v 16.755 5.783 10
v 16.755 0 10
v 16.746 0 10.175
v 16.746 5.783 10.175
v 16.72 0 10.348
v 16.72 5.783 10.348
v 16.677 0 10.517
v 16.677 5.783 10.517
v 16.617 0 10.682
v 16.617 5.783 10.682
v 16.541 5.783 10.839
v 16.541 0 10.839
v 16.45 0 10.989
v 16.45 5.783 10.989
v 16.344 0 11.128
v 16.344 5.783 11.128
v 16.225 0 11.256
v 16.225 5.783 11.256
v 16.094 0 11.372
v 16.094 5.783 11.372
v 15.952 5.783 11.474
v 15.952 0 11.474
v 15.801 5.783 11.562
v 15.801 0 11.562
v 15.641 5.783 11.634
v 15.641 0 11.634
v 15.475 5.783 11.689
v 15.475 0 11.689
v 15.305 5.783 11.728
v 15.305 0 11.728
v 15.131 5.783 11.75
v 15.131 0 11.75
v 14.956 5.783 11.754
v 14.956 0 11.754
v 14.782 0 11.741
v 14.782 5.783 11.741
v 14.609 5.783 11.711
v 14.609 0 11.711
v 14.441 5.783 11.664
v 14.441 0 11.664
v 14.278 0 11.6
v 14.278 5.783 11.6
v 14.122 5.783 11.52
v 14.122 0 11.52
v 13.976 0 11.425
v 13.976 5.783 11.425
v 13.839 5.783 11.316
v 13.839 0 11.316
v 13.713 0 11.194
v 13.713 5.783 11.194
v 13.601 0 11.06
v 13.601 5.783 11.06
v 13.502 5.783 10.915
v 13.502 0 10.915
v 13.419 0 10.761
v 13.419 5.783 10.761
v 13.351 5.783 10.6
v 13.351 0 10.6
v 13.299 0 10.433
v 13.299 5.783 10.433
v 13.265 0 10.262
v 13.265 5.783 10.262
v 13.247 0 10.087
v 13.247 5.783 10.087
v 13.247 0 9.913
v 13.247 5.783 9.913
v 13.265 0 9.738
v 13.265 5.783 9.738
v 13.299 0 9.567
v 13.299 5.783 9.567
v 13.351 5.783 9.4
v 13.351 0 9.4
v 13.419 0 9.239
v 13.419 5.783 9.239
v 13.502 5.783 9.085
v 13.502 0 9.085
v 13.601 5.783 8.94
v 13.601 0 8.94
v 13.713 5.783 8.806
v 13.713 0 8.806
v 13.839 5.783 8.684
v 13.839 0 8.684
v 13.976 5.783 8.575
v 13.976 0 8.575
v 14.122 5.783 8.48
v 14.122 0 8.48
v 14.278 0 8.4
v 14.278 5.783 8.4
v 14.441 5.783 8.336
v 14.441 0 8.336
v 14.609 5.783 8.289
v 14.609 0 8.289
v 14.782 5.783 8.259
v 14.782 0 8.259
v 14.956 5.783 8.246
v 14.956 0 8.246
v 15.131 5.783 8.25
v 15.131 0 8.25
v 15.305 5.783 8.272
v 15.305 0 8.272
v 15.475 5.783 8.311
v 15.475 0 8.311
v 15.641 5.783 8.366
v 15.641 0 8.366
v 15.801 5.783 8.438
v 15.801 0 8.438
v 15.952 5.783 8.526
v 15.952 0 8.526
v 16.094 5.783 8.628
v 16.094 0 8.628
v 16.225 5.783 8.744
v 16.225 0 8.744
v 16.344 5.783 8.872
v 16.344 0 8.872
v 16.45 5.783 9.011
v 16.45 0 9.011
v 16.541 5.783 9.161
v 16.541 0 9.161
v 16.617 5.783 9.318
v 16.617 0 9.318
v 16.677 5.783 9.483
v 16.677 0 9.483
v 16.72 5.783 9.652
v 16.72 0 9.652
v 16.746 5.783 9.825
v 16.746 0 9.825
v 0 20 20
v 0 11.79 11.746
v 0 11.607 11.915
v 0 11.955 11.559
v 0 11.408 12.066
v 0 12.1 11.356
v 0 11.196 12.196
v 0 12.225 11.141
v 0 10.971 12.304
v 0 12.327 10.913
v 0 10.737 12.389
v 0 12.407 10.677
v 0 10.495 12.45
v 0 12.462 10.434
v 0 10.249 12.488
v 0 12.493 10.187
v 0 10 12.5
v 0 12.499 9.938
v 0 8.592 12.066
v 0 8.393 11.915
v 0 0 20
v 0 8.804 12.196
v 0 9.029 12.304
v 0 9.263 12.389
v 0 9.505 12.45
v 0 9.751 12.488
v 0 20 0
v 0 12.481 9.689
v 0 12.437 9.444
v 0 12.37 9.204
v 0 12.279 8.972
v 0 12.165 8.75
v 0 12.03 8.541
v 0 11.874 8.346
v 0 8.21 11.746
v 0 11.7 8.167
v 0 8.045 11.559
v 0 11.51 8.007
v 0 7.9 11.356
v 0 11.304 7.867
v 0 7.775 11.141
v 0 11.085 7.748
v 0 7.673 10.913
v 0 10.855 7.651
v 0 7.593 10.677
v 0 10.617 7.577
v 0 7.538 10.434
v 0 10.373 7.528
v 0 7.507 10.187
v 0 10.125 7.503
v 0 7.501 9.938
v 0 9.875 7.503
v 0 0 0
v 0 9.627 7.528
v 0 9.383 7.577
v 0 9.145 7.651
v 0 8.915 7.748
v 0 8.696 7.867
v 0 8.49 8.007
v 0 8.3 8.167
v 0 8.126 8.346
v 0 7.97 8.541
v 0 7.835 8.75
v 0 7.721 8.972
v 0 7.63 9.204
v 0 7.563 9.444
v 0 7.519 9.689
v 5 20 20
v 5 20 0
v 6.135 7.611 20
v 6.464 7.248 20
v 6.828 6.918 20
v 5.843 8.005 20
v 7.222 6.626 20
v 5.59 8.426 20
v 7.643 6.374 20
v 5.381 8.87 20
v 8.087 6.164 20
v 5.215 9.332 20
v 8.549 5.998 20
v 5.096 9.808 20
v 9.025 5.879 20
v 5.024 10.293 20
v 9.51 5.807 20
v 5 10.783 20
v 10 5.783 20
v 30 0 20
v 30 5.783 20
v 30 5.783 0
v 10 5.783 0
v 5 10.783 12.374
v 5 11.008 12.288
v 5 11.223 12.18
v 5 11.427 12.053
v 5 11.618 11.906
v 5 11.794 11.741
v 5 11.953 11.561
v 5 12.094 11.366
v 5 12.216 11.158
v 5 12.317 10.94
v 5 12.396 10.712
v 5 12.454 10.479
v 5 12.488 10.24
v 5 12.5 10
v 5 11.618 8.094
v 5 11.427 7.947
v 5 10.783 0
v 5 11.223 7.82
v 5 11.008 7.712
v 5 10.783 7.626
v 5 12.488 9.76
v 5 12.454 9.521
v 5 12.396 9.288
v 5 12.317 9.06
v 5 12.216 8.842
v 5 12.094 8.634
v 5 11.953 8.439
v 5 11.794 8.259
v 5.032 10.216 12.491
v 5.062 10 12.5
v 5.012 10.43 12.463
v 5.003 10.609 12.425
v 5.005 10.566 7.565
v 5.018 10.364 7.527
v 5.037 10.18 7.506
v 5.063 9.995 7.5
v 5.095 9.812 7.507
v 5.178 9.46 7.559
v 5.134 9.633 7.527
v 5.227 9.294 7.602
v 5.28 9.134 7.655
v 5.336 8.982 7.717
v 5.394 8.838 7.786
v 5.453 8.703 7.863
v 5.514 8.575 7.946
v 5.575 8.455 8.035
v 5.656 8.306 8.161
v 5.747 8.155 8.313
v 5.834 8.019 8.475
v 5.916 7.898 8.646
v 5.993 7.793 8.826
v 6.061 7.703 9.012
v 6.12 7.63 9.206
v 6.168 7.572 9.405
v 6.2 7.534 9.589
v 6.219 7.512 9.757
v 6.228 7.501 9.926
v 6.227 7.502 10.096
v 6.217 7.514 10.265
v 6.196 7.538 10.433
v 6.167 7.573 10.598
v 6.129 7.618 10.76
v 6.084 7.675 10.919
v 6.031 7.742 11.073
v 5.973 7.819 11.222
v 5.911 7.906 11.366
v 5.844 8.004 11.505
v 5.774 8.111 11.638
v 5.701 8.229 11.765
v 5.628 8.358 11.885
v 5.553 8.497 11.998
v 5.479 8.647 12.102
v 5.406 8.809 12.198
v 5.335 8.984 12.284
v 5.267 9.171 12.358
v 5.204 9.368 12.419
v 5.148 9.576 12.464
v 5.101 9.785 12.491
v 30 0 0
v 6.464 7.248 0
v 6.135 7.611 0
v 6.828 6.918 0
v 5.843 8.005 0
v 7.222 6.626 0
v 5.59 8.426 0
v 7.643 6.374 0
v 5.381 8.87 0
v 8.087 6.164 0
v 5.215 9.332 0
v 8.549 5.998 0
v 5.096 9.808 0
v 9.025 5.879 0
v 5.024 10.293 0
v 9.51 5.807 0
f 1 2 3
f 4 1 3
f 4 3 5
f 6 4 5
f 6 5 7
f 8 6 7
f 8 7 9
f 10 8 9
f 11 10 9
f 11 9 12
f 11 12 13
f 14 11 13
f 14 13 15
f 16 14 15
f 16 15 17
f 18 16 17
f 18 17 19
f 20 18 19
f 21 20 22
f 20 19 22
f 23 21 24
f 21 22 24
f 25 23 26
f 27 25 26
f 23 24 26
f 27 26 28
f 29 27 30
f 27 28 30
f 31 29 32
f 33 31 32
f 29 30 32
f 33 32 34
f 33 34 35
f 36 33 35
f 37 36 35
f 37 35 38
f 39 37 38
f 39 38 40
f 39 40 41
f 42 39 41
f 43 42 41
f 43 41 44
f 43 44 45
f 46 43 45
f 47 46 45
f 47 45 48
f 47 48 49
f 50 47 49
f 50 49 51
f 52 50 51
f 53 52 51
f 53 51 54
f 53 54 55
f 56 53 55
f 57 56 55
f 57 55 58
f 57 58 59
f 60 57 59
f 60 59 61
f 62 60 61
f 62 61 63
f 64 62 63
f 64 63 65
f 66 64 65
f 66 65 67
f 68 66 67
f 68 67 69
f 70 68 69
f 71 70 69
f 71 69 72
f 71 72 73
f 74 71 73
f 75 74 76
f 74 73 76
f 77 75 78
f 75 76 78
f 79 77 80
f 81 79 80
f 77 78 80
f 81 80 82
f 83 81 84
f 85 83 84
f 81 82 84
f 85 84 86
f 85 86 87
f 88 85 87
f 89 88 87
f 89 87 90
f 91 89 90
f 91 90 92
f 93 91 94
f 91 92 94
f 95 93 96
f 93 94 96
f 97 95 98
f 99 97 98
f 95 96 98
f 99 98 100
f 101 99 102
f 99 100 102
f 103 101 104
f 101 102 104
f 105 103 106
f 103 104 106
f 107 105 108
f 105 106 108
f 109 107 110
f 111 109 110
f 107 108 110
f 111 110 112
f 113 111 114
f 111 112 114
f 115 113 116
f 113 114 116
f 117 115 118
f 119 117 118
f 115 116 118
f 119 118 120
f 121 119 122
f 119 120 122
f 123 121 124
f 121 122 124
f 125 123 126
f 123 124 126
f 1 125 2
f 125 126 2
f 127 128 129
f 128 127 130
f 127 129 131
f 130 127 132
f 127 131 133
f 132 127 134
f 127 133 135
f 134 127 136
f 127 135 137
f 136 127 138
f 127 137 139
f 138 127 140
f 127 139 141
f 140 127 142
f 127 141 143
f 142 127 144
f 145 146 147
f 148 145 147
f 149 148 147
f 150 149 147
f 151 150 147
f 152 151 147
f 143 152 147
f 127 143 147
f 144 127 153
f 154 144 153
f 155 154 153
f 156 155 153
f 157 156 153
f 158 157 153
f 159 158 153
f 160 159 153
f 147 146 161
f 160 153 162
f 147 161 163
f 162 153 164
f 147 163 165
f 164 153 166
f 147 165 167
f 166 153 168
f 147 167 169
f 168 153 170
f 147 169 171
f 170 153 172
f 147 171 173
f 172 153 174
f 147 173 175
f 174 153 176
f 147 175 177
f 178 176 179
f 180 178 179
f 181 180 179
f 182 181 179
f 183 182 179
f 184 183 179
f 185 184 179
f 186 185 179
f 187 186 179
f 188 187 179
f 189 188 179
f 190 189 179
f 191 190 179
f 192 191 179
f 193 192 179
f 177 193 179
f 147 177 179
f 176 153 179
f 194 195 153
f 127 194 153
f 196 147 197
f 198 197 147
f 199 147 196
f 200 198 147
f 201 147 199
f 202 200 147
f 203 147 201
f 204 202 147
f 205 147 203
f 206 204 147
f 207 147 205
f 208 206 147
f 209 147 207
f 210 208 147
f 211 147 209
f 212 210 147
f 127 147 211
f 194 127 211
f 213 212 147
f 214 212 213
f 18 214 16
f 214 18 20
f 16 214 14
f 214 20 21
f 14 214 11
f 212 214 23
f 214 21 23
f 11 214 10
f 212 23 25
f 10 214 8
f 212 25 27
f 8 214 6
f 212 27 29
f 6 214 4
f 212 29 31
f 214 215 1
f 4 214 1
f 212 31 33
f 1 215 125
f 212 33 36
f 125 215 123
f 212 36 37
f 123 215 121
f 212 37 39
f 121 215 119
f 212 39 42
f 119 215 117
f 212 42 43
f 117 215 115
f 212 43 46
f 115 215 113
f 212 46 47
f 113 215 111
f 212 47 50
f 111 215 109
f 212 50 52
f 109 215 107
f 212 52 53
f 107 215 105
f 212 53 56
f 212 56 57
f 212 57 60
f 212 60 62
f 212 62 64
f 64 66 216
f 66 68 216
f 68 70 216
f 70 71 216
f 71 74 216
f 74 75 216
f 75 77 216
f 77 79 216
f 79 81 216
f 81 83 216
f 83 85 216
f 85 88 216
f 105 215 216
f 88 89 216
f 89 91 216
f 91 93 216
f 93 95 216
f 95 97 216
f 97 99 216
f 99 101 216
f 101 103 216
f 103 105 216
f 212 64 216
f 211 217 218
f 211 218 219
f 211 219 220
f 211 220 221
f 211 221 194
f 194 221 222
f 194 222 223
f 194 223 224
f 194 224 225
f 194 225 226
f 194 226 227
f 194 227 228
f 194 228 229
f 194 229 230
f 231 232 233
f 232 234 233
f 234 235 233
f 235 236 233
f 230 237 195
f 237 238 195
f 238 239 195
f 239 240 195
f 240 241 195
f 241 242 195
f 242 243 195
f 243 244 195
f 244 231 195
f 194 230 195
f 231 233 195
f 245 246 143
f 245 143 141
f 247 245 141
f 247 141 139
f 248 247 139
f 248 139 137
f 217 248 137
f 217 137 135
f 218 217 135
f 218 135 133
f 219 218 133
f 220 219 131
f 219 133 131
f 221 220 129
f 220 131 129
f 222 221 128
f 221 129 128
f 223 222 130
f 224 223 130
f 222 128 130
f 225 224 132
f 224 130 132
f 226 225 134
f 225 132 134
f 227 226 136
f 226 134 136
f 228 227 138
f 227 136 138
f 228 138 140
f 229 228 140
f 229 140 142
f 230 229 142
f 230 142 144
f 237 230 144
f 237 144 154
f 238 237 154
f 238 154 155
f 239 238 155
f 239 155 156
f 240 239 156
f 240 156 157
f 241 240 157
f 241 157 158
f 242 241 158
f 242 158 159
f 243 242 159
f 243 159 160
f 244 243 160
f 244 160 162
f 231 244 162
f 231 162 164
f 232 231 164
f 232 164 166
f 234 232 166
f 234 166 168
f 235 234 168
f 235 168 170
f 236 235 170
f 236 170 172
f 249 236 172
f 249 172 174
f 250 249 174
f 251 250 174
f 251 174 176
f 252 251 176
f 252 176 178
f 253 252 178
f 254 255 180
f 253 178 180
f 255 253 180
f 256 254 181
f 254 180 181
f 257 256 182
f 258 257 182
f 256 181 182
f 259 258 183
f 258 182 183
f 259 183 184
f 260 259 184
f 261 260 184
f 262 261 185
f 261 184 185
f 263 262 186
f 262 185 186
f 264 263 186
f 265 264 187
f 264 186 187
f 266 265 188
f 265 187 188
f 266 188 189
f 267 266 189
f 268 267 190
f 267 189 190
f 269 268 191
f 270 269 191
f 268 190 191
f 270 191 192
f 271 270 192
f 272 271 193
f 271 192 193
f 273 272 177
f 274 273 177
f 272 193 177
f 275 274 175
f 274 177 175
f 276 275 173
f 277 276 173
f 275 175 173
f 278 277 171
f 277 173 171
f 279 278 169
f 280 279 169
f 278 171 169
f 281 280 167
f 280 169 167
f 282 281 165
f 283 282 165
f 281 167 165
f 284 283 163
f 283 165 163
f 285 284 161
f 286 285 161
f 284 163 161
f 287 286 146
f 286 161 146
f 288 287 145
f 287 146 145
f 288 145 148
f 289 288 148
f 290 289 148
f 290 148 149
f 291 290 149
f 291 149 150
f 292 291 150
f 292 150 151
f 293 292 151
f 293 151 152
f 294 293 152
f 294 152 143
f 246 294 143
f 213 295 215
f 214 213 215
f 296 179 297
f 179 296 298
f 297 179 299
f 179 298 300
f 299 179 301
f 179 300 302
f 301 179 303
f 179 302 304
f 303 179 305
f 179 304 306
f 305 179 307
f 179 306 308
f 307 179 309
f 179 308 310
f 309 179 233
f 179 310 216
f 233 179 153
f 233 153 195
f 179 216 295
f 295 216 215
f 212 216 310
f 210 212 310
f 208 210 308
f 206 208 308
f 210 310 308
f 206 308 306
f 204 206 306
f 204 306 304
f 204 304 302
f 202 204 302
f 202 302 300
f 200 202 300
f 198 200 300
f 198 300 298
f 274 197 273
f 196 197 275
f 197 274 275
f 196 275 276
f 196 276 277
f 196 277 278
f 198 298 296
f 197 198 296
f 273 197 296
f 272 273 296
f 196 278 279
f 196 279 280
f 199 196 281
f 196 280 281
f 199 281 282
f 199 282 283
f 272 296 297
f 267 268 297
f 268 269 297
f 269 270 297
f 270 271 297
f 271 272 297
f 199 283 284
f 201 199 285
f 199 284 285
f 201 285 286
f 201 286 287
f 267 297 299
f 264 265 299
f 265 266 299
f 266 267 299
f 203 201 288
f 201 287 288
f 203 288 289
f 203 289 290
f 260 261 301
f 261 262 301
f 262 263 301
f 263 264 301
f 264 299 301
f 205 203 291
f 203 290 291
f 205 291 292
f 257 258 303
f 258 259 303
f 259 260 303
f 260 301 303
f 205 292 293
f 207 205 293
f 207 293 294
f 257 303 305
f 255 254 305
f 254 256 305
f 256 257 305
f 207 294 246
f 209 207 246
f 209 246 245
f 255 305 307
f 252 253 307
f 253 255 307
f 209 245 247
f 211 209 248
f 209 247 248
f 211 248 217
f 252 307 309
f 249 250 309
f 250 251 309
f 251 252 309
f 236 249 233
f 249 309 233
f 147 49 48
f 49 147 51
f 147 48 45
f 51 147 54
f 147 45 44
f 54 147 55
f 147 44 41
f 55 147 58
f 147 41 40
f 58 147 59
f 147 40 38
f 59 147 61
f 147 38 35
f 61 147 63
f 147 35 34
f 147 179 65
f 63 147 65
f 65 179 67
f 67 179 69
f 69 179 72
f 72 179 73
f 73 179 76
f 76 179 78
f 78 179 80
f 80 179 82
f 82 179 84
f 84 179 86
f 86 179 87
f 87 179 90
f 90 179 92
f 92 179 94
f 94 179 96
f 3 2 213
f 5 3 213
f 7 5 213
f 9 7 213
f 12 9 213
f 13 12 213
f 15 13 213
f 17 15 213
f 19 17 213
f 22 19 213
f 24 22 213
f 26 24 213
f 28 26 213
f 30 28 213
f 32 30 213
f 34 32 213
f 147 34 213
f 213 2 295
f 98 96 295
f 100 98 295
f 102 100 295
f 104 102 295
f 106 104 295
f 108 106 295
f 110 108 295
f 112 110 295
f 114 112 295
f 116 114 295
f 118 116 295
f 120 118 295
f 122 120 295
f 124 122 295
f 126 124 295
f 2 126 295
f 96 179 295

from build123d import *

# Parameters (mm, degrees)
BOSS_EXTRUDE1_DEPTH = 20
SKETCH2_R           = 1.755
CUT_EXTRUDE1_DEPTH  = 20
SKETCH3_R           = 2.5
CUT_EXTRUDE2_DEPTH  = 20


with BuildPart() as part:
    # Sketch1 → Boss-Extrude1 (new body)
    with BuildSketch(Plane.XY):
        with BuildLine():
            Line((0, 20), (0, 0))
            Line((0, 0), (30, 0))
            Line((30, 0), (30, 5.78313253))
            Line((30, 5.78313253), (10, 5.78313253))
            ThreePointArc((10, 5.78313253), (6.464466094, 7.247598624), (5, 10.78313253))
            Line((5, 10.78313253), (5, 20))
            Line((5, 20), (0, 20))
        make_face()
    extrude(amount=BOSS_EXTRUDE1_DEPTH)

    # Sketch2 → Cut-Extrude1 (cut)
    with BuildSketch(Plane.XZ):
        with Locations((15, 10)):
            Circle(SKETCH2_R)
    extrude(amount=-CUT_EXTRUDE1_DEPTH, mode=Mode.SUBTRACT)

    # Sketch3 → Cut-Extrude2 (cut)
    with BuildSketch(Plane.ZY):
        with Locations((10, 10)):
            Circle(SKETCH3_R)
    extrude(amount=-CUT_EXTRUDE2_DEPTH, mode=Mode.SUBTRACT)


solid = part.part
